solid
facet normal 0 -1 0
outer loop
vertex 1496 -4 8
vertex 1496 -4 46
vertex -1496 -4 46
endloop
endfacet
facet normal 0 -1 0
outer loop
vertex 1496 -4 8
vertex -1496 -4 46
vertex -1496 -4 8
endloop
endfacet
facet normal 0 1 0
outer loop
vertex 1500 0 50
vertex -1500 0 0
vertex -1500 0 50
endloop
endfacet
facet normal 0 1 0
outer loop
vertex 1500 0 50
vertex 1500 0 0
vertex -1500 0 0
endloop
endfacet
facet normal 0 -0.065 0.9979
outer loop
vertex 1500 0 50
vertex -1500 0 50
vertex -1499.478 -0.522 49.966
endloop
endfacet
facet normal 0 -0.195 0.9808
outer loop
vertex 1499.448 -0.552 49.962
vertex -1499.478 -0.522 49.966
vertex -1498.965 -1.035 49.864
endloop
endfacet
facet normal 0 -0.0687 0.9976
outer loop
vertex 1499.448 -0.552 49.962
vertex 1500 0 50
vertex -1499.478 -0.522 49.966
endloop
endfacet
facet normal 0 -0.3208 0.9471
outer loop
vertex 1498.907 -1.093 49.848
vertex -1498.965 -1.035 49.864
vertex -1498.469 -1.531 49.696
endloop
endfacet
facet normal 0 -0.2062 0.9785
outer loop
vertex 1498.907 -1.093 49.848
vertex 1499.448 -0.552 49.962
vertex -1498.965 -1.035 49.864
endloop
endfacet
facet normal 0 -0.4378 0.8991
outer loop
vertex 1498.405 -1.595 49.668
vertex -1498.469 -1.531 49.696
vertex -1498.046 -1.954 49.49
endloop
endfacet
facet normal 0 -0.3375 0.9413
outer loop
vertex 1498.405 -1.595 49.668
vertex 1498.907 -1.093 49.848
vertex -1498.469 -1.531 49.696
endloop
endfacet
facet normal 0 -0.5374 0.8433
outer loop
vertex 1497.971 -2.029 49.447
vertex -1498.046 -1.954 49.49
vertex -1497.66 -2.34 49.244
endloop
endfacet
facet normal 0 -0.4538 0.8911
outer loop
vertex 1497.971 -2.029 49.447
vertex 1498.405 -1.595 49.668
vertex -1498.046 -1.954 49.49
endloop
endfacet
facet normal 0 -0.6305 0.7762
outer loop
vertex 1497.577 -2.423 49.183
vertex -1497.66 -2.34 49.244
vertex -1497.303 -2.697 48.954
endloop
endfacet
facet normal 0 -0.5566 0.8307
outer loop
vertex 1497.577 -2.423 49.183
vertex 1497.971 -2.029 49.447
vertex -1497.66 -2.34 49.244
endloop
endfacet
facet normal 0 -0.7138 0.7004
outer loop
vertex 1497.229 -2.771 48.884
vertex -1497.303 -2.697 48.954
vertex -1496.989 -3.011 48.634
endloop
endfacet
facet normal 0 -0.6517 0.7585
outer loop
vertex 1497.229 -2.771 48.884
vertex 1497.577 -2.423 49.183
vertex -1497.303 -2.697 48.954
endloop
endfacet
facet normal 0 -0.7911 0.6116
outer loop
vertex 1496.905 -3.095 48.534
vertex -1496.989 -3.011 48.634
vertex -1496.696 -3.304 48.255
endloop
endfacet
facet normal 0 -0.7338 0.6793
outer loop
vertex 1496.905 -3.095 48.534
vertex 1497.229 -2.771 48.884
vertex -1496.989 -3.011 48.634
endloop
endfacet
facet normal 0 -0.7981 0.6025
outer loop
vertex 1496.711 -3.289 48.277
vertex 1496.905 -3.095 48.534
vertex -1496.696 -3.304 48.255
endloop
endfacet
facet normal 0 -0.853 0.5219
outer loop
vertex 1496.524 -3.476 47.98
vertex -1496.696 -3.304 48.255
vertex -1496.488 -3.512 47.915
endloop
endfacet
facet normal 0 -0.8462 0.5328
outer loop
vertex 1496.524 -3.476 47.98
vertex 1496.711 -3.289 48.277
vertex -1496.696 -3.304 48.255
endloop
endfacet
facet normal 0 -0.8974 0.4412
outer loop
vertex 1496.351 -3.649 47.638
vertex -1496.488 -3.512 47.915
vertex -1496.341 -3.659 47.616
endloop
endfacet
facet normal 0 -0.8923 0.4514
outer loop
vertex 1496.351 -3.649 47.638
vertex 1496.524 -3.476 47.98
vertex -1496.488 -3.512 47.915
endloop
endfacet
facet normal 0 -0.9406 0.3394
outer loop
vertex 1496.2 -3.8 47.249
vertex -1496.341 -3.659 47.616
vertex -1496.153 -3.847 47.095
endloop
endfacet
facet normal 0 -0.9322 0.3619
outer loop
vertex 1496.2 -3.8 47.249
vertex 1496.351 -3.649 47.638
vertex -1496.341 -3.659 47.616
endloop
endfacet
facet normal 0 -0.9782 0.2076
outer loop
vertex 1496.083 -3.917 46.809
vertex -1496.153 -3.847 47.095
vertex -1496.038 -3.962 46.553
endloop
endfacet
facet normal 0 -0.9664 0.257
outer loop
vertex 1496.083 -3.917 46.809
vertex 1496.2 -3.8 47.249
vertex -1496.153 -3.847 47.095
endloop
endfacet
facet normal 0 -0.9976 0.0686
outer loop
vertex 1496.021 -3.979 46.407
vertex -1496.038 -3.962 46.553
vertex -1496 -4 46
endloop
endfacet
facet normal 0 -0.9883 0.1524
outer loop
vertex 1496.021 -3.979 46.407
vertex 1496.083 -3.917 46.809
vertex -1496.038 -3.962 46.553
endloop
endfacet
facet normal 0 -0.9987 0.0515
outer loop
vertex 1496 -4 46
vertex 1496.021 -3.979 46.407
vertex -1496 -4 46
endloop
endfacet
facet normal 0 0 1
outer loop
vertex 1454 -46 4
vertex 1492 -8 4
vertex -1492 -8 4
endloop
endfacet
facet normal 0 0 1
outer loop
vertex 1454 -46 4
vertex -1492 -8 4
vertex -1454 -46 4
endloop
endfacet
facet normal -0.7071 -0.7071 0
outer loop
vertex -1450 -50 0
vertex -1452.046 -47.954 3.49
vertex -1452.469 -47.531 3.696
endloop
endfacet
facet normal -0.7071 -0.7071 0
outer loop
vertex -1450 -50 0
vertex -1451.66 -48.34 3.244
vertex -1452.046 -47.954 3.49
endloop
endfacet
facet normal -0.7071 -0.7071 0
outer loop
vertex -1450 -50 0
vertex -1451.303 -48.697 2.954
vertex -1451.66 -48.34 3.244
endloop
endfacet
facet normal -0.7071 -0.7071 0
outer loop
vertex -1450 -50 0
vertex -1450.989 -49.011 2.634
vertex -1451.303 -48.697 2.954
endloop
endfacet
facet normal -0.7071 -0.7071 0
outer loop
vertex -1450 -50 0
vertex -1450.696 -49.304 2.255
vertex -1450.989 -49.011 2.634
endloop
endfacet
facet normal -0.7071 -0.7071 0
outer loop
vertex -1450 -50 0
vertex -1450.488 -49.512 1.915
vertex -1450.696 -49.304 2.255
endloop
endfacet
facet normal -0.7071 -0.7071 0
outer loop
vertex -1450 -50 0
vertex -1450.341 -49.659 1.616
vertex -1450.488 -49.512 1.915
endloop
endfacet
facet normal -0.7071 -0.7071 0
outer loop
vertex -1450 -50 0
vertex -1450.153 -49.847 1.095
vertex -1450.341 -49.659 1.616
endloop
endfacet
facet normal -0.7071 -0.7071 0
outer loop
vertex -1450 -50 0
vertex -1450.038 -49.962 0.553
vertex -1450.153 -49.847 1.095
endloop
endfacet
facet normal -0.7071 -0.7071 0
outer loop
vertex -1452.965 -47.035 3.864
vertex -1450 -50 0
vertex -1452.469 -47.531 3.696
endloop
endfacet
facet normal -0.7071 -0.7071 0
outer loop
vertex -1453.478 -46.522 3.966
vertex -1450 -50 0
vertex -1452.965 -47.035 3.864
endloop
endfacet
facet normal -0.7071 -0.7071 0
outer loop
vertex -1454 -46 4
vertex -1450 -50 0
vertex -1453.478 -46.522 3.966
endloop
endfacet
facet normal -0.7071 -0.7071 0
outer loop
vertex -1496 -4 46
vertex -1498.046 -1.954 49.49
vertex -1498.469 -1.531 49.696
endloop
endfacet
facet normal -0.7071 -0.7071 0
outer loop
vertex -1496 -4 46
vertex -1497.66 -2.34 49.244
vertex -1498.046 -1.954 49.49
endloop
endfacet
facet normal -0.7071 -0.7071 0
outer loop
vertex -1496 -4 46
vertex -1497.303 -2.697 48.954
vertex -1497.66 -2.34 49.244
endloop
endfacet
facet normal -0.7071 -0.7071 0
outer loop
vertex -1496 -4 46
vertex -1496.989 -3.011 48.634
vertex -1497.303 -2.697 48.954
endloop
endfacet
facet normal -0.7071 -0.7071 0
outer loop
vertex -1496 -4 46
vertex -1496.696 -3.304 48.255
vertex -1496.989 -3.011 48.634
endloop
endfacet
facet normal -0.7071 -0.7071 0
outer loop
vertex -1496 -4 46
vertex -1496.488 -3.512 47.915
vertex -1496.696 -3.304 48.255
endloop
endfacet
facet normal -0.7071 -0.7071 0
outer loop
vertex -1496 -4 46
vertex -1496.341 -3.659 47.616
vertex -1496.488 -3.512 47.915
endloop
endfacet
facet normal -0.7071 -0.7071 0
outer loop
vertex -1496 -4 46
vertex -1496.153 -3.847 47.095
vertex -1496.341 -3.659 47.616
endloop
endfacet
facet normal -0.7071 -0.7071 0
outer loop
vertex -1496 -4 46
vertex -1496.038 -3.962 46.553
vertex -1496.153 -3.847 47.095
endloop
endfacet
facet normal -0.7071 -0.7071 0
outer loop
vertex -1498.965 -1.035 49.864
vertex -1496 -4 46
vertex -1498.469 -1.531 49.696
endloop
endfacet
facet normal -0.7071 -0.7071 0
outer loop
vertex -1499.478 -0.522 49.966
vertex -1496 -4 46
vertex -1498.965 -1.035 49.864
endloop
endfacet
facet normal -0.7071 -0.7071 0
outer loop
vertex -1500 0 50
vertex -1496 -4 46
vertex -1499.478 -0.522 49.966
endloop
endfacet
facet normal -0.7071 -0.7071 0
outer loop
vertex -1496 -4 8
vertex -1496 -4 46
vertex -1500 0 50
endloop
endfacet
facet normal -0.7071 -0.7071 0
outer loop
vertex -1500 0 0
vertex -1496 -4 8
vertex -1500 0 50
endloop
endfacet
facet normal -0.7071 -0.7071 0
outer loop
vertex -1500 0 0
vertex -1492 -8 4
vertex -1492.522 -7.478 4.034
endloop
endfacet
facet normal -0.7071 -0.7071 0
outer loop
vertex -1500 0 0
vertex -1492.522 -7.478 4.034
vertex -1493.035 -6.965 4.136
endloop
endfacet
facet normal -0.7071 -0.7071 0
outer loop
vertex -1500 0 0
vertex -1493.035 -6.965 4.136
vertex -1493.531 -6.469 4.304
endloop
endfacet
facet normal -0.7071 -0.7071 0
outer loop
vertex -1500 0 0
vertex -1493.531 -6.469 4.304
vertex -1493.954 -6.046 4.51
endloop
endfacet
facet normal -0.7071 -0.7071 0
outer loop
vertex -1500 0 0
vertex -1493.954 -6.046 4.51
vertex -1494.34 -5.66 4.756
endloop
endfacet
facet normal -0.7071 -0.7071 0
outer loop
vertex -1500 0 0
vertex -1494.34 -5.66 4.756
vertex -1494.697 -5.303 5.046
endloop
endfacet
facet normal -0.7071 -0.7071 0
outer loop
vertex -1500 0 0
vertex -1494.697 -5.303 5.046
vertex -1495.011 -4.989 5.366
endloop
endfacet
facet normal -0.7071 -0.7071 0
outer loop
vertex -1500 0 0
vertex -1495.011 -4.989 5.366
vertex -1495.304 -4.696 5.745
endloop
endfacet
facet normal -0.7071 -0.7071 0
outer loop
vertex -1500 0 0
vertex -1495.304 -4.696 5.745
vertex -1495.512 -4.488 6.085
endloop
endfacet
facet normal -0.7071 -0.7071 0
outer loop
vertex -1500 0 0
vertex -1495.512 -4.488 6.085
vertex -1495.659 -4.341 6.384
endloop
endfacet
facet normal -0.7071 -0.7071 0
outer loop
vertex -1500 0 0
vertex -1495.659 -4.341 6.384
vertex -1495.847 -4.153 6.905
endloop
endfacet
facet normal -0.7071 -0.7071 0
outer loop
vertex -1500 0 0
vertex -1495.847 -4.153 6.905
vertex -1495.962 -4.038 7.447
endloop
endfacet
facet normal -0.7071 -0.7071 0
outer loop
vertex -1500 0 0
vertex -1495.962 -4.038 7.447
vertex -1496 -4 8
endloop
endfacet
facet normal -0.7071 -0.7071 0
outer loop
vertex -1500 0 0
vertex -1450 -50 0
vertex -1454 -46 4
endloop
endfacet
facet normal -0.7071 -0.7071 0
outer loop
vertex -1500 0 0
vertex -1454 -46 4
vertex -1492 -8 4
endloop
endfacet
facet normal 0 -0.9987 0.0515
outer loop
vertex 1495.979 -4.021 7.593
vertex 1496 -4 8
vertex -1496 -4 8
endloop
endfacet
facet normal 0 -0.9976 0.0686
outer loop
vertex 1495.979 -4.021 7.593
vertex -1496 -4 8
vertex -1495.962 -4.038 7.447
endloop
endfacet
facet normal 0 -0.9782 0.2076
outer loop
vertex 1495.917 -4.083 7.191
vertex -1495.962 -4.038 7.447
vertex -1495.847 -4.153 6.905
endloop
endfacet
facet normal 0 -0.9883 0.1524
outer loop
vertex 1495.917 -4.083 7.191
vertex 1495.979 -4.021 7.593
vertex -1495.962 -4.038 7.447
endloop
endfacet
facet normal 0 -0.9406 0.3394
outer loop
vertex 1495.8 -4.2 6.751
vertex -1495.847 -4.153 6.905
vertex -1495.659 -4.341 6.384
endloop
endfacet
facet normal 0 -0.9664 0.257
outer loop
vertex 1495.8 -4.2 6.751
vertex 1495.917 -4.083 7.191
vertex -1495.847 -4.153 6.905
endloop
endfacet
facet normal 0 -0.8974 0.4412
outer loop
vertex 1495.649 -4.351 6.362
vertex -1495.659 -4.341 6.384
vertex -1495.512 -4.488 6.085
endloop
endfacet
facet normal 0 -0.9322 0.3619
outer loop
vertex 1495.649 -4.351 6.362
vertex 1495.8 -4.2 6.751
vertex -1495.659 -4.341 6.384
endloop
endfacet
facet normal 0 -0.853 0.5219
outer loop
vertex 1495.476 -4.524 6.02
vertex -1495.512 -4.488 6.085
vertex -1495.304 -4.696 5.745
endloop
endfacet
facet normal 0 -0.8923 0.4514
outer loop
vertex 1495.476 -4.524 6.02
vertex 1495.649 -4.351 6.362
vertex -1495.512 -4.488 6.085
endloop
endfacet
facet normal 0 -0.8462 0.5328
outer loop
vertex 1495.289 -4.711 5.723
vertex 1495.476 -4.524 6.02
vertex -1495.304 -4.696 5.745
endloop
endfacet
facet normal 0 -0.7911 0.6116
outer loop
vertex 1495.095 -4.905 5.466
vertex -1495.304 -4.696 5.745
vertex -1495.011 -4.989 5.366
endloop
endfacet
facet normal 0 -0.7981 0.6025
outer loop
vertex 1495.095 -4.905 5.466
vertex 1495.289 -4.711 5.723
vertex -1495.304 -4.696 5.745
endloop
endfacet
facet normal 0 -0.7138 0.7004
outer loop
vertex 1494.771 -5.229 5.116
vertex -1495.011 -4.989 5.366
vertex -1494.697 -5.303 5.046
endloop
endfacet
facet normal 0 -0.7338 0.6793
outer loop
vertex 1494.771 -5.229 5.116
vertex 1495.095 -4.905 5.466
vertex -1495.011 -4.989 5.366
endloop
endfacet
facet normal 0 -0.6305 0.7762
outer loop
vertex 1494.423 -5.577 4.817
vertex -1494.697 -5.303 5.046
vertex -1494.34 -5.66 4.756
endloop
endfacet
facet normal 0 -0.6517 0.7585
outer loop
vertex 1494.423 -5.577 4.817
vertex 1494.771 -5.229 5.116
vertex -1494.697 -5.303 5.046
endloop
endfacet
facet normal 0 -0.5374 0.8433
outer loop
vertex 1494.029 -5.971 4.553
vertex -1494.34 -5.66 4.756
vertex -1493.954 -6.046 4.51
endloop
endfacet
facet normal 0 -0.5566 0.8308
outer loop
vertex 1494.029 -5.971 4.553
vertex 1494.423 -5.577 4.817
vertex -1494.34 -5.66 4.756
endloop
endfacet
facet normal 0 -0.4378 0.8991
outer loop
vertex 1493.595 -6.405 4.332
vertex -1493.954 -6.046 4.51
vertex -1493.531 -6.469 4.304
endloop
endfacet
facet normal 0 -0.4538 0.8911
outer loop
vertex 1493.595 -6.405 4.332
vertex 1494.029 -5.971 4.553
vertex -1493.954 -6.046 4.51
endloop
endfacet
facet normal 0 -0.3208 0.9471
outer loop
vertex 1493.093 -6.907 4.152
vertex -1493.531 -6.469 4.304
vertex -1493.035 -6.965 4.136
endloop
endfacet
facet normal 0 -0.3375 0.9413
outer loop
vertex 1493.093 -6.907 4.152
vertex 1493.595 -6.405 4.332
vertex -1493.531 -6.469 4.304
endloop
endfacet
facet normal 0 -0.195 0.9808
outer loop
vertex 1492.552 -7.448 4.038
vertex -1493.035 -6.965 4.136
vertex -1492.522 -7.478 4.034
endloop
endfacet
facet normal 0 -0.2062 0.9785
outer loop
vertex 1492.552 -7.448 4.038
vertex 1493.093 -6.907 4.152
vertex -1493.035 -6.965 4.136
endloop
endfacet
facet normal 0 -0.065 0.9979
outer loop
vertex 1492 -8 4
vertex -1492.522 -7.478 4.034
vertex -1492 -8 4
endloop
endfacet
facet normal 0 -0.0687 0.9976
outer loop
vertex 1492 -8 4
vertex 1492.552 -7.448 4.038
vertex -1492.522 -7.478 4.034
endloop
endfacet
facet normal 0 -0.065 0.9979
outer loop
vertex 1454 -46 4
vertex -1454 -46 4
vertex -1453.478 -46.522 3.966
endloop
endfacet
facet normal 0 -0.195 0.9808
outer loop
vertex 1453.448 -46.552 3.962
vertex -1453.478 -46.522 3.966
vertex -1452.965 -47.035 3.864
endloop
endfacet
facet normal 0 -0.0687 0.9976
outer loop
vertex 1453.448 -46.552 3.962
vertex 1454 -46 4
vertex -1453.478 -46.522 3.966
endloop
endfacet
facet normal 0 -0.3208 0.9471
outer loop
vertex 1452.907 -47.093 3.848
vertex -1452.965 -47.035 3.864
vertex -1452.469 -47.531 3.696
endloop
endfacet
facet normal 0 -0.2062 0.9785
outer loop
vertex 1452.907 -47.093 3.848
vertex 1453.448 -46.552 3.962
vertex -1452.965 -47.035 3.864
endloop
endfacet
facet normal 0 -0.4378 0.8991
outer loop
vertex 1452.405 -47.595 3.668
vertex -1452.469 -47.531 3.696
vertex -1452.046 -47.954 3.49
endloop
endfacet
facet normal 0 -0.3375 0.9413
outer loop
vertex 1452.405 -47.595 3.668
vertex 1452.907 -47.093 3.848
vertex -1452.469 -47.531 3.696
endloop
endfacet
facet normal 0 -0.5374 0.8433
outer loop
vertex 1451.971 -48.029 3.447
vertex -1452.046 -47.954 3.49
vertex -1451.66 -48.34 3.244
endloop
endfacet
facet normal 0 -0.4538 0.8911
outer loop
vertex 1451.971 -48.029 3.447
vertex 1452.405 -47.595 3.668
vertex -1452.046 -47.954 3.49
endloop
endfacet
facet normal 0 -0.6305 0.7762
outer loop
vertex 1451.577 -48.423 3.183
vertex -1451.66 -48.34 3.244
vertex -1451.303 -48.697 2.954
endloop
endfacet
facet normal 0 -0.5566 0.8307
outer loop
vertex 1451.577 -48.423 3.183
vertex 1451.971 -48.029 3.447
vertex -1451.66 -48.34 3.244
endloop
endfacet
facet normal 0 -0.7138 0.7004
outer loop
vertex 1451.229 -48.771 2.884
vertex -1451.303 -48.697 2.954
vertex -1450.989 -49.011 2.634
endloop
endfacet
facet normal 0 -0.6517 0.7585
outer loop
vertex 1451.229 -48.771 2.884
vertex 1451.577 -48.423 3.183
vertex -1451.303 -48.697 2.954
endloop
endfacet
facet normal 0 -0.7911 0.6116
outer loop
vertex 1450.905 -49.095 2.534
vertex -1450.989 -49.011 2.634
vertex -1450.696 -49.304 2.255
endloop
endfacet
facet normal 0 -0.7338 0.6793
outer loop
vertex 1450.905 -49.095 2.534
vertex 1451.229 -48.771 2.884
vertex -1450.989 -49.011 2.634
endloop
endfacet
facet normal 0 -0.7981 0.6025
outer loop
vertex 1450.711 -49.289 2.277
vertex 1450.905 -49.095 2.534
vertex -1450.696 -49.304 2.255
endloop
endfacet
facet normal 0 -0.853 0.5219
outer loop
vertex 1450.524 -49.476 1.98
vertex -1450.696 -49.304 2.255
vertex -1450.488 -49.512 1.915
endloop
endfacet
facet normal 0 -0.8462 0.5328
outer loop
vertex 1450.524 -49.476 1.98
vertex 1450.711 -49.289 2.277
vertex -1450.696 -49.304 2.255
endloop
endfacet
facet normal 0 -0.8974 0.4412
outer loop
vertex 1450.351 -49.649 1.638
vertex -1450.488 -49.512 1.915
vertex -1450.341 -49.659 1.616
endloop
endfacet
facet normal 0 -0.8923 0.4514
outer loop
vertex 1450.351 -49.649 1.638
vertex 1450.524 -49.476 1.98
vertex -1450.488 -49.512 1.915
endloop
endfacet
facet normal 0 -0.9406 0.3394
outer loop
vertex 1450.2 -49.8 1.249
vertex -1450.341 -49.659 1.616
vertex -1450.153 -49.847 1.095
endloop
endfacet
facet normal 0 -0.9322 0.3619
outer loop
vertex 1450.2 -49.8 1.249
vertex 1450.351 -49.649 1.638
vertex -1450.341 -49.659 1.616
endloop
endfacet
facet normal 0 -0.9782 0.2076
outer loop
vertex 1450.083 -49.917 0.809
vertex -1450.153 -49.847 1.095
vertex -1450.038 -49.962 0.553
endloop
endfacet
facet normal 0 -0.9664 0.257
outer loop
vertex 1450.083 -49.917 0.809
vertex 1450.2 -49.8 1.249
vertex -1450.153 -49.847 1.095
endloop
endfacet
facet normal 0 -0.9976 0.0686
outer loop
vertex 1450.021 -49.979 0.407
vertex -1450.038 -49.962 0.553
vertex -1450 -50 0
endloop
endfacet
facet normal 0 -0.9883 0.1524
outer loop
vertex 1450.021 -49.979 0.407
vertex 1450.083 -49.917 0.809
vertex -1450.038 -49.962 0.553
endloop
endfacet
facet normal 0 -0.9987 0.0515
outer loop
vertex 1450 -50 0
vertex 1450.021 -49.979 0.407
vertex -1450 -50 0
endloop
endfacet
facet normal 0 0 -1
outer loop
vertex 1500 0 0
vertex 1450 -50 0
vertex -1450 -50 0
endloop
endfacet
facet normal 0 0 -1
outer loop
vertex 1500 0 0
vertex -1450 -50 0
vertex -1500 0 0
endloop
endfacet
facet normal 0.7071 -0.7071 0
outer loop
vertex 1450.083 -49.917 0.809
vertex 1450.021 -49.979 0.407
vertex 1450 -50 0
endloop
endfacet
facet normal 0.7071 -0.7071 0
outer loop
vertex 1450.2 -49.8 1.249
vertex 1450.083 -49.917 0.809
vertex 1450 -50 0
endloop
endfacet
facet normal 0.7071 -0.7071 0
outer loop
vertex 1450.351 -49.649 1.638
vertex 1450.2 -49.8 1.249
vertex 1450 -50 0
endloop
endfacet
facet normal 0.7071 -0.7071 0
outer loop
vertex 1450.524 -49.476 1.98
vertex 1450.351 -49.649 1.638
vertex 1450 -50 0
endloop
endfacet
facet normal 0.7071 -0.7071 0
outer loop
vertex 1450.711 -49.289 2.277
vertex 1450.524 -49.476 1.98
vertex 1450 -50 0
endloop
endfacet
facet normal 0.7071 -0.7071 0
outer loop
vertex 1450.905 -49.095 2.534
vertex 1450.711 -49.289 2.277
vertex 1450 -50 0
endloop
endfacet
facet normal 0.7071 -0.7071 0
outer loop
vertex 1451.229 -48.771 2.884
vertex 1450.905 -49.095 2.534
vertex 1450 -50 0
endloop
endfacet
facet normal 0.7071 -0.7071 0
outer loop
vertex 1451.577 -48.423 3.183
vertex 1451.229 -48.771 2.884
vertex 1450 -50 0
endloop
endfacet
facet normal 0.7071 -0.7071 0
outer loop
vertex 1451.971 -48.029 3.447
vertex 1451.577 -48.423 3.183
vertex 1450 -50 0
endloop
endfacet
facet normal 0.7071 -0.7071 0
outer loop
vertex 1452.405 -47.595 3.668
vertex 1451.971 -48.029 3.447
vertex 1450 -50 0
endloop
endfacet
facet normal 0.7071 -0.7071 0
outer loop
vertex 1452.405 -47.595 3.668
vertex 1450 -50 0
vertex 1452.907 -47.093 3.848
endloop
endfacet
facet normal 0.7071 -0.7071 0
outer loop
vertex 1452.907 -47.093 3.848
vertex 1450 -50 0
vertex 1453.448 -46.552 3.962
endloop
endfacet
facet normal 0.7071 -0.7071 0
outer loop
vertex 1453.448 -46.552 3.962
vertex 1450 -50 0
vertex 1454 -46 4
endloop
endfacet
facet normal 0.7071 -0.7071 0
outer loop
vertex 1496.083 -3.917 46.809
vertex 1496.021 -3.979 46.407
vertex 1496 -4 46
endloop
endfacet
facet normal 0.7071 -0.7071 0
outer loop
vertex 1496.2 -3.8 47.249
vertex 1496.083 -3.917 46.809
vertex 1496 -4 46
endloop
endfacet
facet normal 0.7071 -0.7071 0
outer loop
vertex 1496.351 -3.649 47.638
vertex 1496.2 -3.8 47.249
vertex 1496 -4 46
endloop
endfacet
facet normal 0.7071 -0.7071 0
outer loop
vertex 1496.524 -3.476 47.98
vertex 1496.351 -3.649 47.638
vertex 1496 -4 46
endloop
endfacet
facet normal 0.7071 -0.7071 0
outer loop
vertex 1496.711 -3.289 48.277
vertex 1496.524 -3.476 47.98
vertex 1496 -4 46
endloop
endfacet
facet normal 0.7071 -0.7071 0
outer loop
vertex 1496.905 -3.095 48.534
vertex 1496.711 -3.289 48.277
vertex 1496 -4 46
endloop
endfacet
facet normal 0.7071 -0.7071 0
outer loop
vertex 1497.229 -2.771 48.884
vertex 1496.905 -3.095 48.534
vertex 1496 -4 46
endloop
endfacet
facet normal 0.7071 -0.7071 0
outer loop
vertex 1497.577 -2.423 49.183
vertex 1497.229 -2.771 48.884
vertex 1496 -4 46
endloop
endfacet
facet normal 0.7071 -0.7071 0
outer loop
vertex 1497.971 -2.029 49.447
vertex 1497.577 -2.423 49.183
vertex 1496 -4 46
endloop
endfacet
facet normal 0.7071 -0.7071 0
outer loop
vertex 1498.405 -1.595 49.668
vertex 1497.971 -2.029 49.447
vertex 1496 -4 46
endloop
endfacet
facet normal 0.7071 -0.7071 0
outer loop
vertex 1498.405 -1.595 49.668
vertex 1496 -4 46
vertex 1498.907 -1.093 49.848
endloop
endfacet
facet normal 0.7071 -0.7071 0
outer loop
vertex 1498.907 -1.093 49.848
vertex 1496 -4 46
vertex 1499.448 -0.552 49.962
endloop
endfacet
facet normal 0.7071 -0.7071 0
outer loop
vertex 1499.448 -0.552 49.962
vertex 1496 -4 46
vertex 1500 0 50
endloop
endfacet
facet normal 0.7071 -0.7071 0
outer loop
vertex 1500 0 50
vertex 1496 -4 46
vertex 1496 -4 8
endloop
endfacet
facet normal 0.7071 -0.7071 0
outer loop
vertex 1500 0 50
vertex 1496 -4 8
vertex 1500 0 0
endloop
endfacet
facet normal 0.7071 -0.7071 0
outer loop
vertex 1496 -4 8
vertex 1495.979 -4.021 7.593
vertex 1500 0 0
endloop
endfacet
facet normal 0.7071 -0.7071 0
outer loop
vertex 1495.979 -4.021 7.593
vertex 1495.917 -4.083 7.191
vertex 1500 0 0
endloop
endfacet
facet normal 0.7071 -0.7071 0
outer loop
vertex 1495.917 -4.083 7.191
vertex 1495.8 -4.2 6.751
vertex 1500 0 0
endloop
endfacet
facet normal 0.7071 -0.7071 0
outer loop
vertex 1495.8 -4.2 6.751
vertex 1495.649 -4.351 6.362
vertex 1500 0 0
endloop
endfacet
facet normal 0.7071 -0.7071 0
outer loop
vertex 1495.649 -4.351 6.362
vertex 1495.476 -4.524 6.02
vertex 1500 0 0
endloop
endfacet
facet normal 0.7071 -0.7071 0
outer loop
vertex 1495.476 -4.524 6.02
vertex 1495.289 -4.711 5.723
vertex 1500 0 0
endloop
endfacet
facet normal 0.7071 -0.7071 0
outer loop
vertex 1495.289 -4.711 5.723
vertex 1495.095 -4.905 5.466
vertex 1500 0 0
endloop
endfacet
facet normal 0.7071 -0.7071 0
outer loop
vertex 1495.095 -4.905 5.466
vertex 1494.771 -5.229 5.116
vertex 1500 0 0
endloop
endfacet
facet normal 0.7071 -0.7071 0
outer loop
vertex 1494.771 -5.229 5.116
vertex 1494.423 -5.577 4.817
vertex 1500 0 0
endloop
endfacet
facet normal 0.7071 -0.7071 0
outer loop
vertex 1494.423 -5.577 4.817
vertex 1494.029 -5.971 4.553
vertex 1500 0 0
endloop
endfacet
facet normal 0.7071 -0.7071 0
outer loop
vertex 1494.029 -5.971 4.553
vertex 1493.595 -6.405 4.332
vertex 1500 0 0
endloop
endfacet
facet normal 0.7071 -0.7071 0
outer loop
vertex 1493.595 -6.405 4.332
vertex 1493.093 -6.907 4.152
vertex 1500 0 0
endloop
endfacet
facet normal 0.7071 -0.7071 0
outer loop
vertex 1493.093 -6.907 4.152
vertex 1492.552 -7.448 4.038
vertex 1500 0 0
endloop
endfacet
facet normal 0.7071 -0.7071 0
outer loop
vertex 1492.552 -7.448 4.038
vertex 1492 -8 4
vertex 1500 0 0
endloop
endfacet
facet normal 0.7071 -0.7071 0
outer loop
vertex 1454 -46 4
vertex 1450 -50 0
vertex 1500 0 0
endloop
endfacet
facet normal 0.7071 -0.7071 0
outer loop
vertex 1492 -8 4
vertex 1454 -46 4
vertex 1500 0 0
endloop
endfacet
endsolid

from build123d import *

# Parameters (mm, degrees)
F1_DEPTH = 1500
F3_DEPTH = 50.001


# Not quite as in the source:
# - a pattern or mirror of a feature is missing from the dataset's text; its kind, count and spacing are read off the source's solid


with BuildPart() as f1:
    # F0 (on Right) → F1 (new body, symmetric)
    with BuildSketch(Plane.YZ):
        with BuildLine():
            Line((0, 0), (0, 50))
            ThreePointArc((0, 50), (-2.8284271247, 48.8284271247), (-4, 46))
            Line((-4, 46), (-4, 8))
            ThreePointArc((-4, 8), (-5.1715728753, 5.1715728753), (-8, 4))
            Line((-8, 4), (-46, 4))
            ThreePointArc((-46, 4), (-48.8284271247, 2.8284271247), (-50, 0))
            Line((-50, 0), (0, 0))
        make_face()
    extrude(amount=F1_DEPTH, both=True)

    # F2 (on face) → F3 (cut, through all)
    with BuildSketch(Plane(origin=(0, 0, 0), x_dir=(1, 0, 0), z_dir=(0, 0, -1))):
        Polygon((1450, 50), (1500, 0), (1500, 50), align=None)
    f3 = extrude(amount=-F3_DEPTH, mode=Mode.SUBTRACT)

    # F3_copies: F3 across plane
    add(f3.mirror(Plane(origin=(0, 0, 0), x_dir=(0, 0, -1), z_dir=(-1, 0, 0))), mode=Mode.SUBTRACT)


solid = f1.part
